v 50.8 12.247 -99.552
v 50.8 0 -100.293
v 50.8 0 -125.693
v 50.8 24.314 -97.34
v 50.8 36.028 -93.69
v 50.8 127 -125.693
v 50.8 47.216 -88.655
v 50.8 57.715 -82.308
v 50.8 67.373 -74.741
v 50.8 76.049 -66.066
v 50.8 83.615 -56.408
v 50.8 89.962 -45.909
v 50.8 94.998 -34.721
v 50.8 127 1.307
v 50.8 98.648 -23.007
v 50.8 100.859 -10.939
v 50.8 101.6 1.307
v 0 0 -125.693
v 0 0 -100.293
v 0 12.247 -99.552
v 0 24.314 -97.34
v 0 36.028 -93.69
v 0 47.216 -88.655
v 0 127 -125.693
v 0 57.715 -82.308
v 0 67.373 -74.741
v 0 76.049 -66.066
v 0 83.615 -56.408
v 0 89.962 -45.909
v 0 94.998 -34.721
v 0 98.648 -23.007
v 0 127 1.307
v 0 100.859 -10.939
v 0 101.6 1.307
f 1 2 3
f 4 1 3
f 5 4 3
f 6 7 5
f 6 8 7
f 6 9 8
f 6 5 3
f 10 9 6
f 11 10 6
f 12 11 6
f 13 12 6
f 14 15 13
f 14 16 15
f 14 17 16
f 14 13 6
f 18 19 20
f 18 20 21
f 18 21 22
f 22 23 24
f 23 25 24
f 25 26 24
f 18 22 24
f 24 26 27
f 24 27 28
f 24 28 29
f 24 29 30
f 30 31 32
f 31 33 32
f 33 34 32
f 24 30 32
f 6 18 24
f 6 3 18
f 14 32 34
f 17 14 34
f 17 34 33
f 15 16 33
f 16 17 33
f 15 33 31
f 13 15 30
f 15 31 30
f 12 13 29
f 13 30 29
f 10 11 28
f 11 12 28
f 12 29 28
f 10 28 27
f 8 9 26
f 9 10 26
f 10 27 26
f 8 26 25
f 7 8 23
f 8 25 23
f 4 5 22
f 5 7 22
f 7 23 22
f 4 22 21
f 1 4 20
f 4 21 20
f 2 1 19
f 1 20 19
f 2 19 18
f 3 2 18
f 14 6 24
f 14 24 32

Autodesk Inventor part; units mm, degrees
ref_plane "YZ Plane" through (0, 0, 0) normal (1, 0, 0) x (0, 1, 0)
ref_plane "XZ Plane" through (0, 0, 0) normal (0, 1, 0) x (-1, 0, 0)
ref_plane "XY Plane" through (0, 0, 0) normal (0, 0, 1) x (1, 0, 0)
sketch "Sketch1" plane through (0, 0, 0) normal (1, 0, 0) x (0, 1, 0)
  circle A0 centre (0, 1.3072) radius 101.6
  circle A1 centre (0, 1.3072) radius 107.95
  point P0 (0, 0)
  dimension "d0" = 203.2
  dimension "d1" = 215.9
extrude "Extrusion1" add sketch "Sketch1" along normal blind 50.8
sketch "Sketch2" plane through (50.8, 0, 1.3072) normal (1, 0, 0) x (0, 0, -1)
  circle A0 centre (0, 0) radius 101.6 projected
  circle A1 centre (0, 0) radius 107.95 projected
  line L0 (127, 0) -> (127, 127)
  line L1 (127, 127) -> (0, 127)
  line L2 (0, 127) -> (0, 107.95)
  arc A2 (107.95, 0) -> (0, 107.95) centre (0, 0) ccw
  line L3 (107.95, 0) -> (127, 0)
  dimension "d13" = 127
  dimension "d15" = 127
extrude "Extrusion2" add sketch "Sketch2" against normal blind 50.8 contours A1 L2 L1 L0 L3
sketch "Sketch3" plane through (50.8, 0, 0) normal (1, 0, 0) x (0, 0, -1)
  line L0 (-164.0903, 142.5246) -> (-1.3072, 142.5246)
  line L1 (-20.2178, -157.5435) -> (-164.0903, -157.5435)
  line L2 (-164.0903, -157.5435) -> (-164.0903, 142.5246)
  line L3 (195.7449, 0) -> (-1.3072, 0)
  line L4 (-20.2178, -149.5335) -> (195.7449, -149.5335)
  line L5 (195.7449, -149.5335) -> (195.7449, 0)
  line L6 (106.6428, 0) -> (125.6928, 0) projected
  line L7 (-1.3072, 142.5246) -> (-1.3072, 0)
  line L8 (-20.2178, -149.5335) -> (-20.2178, -157.5435)
  line L9 (-1.3072, 127) -> (-1.3072, 107.95) projected
  point P0 (0, 0)
  dimension "d18" = 0
  dimension "d19" = 0
extrude "Extrusion3" cut sketch "Sketch3" against normal blind 50.8
properties part number "Ramp"
